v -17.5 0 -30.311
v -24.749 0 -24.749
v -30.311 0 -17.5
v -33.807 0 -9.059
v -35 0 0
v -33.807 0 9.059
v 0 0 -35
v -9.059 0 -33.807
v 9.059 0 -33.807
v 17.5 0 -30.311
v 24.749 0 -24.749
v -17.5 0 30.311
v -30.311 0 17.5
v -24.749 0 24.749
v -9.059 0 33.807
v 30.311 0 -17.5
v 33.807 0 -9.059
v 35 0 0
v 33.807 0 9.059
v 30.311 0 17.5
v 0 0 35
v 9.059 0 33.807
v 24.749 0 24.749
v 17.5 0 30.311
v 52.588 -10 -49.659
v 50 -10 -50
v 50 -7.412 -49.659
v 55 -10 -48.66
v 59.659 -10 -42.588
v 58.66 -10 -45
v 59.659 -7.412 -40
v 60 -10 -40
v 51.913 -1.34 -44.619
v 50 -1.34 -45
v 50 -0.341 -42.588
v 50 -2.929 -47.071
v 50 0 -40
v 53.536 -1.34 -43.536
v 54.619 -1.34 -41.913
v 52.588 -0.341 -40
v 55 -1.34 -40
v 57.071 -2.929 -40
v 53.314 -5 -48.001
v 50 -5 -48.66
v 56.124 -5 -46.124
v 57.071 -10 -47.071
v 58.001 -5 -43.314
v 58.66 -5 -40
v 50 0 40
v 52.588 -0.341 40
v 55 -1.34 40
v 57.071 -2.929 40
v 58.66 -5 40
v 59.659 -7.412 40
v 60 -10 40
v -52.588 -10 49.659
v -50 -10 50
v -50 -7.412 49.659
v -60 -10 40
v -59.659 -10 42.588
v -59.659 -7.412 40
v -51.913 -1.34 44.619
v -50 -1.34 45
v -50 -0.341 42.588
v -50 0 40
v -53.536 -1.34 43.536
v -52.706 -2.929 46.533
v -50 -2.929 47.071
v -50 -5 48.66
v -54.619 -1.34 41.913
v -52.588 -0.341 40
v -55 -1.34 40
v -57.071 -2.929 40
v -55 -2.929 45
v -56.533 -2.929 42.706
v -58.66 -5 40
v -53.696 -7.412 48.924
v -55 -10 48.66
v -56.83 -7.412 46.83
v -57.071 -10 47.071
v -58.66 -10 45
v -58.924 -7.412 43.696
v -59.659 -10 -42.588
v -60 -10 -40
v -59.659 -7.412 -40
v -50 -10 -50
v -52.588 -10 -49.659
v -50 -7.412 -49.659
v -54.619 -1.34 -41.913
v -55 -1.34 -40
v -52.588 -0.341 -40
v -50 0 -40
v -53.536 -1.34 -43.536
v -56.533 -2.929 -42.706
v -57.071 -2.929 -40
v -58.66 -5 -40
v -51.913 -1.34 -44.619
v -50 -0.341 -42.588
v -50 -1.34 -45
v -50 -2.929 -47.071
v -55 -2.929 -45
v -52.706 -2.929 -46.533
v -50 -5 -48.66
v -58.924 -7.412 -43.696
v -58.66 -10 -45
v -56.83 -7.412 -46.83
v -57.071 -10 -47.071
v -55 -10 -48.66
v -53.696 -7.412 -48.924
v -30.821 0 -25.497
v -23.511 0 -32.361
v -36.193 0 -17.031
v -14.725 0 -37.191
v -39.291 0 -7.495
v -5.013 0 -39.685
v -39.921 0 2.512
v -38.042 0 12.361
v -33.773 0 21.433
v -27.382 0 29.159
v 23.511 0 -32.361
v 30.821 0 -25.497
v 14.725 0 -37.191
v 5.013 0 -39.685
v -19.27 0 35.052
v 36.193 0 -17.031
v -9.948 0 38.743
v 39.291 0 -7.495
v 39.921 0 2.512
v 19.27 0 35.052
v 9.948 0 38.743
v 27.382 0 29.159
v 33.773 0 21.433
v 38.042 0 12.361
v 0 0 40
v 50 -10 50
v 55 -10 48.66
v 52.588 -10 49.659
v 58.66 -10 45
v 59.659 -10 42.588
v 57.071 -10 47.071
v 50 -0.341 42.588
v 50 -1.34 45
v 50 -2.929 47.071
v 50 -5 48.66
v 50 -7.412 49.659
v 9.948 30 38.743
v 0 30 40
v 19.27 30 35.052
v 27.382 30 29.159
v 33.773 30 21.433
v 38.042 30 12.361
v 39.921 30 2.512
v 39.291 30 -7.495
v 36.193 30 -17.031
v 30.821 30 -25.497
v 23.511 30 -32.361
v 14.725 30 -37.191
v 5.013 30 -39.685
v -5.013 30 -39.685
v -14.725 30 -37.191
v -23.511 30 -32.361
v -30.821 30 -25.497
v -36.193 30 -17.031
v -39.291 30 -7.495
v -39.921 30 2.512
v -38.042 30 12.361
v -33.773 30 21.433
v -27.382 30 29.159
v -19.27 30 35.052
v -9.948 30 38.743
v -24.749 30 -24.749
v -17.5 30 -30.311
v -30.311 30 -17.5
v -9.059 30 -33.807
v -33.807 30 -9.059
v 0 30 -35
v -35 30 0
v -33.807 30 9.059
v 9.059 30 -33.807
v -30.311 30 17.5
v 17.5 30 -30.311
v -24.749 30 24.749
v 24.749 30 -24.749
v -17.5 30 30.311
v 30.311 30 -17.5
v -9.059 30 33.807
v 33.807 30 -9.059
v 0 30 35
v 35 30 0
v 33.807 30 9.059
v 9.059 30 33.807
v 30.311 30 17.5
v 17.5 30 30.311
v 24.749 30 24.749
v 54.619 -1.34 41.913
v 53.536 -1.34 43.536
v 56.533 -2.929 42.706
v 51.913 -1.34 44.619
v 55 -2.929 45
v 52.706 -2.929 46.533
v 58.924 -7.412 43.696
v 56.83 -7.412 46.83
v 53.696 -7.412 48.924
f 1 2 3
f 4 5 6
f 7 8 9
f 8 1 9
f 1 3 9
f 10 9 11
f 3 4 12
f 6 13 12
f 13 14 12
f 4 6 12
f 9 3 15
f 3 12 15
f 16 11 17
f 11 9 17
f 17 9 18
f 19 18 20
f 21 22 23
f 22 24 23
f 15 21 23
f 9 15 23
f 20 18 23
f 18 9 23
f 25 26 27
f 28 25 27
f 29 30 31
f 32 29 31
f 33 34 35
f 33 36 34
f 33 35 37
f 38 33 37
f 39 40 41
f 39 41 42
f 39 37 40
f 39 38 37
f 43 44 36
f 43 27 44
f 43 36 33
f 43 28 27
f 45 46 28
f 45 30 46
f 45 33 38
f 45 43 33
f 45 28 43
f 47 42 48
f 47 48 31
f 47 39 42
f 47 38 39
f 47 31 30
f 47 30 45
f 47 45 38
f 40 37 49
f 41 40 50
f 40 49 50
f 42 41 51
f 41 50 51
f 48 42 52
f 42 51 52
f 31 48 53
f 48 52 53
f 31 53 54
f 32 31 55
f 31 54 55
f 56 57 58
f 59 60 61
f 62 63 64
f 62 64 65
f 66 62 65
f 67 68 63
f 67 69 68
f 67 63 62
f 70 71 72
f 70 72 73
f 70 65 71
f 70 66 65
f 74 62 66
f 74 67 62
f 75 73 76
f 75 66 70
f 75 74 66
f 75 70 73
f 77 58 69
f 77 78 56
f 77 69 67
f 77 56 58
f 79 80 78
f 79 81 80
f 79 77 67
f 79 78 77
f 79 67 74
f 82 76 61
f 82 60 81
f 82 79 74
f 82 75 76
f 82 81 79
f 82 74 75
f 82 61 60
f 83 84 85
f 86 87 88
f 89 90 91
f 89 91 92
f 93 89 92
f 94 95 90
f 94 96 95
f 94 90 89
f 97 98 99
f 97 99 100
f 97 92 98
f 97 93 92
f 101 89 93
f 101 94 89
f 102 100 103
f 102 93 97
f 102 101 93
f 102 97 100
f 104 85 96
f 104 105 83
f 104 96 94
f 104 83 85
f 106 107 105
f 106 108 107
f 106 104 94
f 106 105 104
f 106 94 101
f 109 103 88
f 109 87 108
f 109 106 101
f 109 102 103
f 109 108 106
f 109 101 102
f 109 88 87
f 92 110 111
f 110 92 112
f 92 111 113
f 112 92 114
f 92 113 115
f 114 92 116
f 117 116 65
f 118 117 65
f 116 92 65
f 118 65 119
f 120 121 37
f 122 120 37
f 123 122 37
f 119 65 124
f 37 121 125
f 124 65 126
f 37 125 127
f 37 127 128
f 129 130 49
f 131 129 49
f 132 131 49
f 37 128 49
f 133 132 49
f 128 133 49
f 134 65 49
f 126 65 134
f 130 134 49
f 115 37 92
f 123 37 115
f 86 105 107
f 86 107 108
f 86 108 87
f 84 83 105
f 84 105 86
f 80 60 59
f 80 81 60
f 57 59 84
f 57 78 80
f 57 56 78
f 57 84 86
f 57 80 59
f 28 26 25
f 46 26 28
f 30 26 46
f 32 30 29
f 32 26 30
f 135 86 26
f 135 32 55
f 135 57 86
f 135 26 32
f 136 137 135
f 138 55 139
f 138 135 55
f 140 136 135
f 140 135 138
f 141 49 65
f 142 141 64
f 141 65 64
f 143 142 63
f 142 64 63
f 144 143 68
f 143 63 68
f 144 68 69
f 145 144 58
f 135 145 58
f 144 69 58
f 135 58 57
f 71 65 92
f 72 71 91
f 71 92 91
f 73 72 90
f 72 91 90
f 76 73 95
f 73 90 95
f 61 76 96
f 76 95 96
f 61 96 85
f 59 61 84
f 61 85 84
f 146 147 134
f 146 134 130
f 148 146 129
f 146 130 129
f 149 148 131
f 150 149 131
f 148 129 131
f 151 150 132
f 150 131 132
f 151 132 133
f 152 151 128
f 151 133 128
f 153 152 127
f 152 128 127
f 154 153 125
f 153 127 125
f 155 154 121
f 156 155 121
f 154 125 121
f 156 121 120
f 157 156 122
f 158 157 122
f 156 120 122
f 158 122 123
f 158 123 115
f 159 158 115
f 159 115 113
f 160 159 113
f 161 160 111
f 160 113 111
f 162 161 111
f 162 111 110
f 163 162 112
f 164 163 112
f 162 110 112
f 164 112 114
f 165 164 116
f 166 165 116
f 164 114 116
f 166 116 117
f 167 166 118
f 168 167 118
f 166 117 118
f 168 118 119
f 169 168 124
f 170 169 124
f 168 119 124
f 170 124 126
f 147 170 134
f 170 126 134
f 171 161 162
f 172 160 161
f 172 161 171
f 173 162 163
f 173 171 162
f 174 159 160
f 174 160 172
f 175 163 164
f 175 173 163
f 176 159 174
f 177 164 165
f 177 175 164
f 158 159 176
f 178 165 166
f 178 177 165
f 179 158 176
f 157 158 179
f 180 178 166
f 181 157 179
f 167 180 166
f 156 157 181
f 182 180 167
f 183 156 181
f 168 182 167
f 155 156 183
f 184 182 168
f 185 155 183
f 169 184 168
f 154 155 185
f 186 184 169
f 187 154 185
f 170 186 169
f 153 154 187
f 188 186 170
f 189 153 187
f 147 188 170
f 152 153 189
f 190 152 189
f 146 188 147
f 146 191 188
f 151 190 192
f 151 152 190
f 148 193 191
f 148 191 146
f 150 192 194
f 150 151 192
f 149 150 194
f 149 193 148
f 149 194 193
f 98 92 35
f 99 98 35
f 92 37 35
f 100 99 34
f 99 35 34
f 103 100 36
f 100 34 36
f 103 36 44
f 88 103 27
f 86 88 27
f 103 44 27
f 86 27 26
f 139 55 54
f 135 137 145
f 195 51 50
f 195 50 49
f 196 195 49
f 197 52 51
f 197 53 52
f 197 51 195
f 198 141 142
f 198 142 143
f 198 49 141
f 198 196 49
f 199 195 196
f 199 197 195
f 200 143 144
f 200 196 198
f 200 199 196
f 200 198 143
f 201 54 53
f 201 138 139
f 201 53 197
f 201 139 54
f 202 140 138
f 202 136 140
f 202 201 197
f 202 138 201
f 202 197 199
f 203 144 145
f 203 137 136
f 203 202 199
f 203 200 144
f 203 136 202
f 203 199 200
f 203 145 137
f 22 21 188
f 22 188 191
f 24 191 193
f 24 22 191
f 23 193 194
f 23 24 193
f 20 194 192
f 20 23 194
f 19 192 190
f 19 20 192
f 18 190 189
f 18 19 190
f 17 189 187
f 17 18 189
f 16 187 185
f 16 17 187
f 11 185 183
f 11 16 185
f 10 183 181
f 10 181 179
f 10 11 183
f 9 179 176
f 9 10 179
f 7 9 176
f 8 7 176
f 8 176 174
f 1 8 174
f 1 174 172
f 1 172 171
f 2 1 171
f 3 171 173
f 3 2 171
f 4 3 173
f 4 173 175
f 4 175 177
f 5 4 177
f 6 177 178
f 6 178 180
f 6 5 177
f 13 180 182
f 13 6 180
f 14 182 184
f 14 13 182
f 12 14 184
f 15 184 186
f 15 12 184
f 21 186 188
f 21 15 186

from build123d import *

# Parameters (mm, degrees)
SKETCH1_R           = 40
SKETCH1_R_2         = 35
BOSS_EXTRUDE1_DEPTH = 30
SKETCH2_W           = 120
SKETCH2_H           = 100
BOSS_EXTRUDE2_DEPTH = 10
FILLET4_R           = 10
FILLET5_R           = 10


with BuildPart() as part:
    # Sketch1 → Boss-Extrude1 (new body)
    with BuildSketch(Plane(origin=(0, 0, 0), x_dir=(1, 0, 0), z_dir=(0, 1, 0))):
        with Locations(Location((0, 0, 0), (0, 0, 270))):
            Circle(SKETCH1_R)
        with Locations(Location((0, 0, 0), (0, 0, 270))):
            Circle(SKETCH1_R_2, mode=Mode.SUBTRACT)
    extrude(amount=BOSS_EXTRUDE1_DEPTH)

    # Sketch2 → Boss-Extrude2 (add)
    with BuildSketch(Plane.XZ):
        Rectangle(SKETCH2_W, SKETCH2_H)
    extrude(amount=BOSS_EXTRUDE2_DEPTH)

    # Fillet4
    fillet4_edges = [part.edges().sort_by_distance(p)[0] for p in [
        (60, -5, -50),
        (60, -5, 50),
        (-60, -5, 50),
        (-60, -5, -50),
    ]]
    fillet(fillet4_edges, radius=FILLET4_R)

    # Fillet5
    fillet5_edges = [part.edges().sort_by_distance(p)[0] for p in [
        (57.071067812, 0, -47.071067812),
        (0, 0, -50),
        (-57.071067812, 0, -47.071067812),
        (-60, 0, 0),
        (-57.071067812, 0, 47.071067812),
        (0, 0, 50),
        (57.071067812, 0, 47.071067812),
        (60, 0, 0),
    ]]
    fillet(fillet5_edges, radius=FILLET5_R - 0.0001)  # a hair under: the kernel refuses the full size


solid = part.part
